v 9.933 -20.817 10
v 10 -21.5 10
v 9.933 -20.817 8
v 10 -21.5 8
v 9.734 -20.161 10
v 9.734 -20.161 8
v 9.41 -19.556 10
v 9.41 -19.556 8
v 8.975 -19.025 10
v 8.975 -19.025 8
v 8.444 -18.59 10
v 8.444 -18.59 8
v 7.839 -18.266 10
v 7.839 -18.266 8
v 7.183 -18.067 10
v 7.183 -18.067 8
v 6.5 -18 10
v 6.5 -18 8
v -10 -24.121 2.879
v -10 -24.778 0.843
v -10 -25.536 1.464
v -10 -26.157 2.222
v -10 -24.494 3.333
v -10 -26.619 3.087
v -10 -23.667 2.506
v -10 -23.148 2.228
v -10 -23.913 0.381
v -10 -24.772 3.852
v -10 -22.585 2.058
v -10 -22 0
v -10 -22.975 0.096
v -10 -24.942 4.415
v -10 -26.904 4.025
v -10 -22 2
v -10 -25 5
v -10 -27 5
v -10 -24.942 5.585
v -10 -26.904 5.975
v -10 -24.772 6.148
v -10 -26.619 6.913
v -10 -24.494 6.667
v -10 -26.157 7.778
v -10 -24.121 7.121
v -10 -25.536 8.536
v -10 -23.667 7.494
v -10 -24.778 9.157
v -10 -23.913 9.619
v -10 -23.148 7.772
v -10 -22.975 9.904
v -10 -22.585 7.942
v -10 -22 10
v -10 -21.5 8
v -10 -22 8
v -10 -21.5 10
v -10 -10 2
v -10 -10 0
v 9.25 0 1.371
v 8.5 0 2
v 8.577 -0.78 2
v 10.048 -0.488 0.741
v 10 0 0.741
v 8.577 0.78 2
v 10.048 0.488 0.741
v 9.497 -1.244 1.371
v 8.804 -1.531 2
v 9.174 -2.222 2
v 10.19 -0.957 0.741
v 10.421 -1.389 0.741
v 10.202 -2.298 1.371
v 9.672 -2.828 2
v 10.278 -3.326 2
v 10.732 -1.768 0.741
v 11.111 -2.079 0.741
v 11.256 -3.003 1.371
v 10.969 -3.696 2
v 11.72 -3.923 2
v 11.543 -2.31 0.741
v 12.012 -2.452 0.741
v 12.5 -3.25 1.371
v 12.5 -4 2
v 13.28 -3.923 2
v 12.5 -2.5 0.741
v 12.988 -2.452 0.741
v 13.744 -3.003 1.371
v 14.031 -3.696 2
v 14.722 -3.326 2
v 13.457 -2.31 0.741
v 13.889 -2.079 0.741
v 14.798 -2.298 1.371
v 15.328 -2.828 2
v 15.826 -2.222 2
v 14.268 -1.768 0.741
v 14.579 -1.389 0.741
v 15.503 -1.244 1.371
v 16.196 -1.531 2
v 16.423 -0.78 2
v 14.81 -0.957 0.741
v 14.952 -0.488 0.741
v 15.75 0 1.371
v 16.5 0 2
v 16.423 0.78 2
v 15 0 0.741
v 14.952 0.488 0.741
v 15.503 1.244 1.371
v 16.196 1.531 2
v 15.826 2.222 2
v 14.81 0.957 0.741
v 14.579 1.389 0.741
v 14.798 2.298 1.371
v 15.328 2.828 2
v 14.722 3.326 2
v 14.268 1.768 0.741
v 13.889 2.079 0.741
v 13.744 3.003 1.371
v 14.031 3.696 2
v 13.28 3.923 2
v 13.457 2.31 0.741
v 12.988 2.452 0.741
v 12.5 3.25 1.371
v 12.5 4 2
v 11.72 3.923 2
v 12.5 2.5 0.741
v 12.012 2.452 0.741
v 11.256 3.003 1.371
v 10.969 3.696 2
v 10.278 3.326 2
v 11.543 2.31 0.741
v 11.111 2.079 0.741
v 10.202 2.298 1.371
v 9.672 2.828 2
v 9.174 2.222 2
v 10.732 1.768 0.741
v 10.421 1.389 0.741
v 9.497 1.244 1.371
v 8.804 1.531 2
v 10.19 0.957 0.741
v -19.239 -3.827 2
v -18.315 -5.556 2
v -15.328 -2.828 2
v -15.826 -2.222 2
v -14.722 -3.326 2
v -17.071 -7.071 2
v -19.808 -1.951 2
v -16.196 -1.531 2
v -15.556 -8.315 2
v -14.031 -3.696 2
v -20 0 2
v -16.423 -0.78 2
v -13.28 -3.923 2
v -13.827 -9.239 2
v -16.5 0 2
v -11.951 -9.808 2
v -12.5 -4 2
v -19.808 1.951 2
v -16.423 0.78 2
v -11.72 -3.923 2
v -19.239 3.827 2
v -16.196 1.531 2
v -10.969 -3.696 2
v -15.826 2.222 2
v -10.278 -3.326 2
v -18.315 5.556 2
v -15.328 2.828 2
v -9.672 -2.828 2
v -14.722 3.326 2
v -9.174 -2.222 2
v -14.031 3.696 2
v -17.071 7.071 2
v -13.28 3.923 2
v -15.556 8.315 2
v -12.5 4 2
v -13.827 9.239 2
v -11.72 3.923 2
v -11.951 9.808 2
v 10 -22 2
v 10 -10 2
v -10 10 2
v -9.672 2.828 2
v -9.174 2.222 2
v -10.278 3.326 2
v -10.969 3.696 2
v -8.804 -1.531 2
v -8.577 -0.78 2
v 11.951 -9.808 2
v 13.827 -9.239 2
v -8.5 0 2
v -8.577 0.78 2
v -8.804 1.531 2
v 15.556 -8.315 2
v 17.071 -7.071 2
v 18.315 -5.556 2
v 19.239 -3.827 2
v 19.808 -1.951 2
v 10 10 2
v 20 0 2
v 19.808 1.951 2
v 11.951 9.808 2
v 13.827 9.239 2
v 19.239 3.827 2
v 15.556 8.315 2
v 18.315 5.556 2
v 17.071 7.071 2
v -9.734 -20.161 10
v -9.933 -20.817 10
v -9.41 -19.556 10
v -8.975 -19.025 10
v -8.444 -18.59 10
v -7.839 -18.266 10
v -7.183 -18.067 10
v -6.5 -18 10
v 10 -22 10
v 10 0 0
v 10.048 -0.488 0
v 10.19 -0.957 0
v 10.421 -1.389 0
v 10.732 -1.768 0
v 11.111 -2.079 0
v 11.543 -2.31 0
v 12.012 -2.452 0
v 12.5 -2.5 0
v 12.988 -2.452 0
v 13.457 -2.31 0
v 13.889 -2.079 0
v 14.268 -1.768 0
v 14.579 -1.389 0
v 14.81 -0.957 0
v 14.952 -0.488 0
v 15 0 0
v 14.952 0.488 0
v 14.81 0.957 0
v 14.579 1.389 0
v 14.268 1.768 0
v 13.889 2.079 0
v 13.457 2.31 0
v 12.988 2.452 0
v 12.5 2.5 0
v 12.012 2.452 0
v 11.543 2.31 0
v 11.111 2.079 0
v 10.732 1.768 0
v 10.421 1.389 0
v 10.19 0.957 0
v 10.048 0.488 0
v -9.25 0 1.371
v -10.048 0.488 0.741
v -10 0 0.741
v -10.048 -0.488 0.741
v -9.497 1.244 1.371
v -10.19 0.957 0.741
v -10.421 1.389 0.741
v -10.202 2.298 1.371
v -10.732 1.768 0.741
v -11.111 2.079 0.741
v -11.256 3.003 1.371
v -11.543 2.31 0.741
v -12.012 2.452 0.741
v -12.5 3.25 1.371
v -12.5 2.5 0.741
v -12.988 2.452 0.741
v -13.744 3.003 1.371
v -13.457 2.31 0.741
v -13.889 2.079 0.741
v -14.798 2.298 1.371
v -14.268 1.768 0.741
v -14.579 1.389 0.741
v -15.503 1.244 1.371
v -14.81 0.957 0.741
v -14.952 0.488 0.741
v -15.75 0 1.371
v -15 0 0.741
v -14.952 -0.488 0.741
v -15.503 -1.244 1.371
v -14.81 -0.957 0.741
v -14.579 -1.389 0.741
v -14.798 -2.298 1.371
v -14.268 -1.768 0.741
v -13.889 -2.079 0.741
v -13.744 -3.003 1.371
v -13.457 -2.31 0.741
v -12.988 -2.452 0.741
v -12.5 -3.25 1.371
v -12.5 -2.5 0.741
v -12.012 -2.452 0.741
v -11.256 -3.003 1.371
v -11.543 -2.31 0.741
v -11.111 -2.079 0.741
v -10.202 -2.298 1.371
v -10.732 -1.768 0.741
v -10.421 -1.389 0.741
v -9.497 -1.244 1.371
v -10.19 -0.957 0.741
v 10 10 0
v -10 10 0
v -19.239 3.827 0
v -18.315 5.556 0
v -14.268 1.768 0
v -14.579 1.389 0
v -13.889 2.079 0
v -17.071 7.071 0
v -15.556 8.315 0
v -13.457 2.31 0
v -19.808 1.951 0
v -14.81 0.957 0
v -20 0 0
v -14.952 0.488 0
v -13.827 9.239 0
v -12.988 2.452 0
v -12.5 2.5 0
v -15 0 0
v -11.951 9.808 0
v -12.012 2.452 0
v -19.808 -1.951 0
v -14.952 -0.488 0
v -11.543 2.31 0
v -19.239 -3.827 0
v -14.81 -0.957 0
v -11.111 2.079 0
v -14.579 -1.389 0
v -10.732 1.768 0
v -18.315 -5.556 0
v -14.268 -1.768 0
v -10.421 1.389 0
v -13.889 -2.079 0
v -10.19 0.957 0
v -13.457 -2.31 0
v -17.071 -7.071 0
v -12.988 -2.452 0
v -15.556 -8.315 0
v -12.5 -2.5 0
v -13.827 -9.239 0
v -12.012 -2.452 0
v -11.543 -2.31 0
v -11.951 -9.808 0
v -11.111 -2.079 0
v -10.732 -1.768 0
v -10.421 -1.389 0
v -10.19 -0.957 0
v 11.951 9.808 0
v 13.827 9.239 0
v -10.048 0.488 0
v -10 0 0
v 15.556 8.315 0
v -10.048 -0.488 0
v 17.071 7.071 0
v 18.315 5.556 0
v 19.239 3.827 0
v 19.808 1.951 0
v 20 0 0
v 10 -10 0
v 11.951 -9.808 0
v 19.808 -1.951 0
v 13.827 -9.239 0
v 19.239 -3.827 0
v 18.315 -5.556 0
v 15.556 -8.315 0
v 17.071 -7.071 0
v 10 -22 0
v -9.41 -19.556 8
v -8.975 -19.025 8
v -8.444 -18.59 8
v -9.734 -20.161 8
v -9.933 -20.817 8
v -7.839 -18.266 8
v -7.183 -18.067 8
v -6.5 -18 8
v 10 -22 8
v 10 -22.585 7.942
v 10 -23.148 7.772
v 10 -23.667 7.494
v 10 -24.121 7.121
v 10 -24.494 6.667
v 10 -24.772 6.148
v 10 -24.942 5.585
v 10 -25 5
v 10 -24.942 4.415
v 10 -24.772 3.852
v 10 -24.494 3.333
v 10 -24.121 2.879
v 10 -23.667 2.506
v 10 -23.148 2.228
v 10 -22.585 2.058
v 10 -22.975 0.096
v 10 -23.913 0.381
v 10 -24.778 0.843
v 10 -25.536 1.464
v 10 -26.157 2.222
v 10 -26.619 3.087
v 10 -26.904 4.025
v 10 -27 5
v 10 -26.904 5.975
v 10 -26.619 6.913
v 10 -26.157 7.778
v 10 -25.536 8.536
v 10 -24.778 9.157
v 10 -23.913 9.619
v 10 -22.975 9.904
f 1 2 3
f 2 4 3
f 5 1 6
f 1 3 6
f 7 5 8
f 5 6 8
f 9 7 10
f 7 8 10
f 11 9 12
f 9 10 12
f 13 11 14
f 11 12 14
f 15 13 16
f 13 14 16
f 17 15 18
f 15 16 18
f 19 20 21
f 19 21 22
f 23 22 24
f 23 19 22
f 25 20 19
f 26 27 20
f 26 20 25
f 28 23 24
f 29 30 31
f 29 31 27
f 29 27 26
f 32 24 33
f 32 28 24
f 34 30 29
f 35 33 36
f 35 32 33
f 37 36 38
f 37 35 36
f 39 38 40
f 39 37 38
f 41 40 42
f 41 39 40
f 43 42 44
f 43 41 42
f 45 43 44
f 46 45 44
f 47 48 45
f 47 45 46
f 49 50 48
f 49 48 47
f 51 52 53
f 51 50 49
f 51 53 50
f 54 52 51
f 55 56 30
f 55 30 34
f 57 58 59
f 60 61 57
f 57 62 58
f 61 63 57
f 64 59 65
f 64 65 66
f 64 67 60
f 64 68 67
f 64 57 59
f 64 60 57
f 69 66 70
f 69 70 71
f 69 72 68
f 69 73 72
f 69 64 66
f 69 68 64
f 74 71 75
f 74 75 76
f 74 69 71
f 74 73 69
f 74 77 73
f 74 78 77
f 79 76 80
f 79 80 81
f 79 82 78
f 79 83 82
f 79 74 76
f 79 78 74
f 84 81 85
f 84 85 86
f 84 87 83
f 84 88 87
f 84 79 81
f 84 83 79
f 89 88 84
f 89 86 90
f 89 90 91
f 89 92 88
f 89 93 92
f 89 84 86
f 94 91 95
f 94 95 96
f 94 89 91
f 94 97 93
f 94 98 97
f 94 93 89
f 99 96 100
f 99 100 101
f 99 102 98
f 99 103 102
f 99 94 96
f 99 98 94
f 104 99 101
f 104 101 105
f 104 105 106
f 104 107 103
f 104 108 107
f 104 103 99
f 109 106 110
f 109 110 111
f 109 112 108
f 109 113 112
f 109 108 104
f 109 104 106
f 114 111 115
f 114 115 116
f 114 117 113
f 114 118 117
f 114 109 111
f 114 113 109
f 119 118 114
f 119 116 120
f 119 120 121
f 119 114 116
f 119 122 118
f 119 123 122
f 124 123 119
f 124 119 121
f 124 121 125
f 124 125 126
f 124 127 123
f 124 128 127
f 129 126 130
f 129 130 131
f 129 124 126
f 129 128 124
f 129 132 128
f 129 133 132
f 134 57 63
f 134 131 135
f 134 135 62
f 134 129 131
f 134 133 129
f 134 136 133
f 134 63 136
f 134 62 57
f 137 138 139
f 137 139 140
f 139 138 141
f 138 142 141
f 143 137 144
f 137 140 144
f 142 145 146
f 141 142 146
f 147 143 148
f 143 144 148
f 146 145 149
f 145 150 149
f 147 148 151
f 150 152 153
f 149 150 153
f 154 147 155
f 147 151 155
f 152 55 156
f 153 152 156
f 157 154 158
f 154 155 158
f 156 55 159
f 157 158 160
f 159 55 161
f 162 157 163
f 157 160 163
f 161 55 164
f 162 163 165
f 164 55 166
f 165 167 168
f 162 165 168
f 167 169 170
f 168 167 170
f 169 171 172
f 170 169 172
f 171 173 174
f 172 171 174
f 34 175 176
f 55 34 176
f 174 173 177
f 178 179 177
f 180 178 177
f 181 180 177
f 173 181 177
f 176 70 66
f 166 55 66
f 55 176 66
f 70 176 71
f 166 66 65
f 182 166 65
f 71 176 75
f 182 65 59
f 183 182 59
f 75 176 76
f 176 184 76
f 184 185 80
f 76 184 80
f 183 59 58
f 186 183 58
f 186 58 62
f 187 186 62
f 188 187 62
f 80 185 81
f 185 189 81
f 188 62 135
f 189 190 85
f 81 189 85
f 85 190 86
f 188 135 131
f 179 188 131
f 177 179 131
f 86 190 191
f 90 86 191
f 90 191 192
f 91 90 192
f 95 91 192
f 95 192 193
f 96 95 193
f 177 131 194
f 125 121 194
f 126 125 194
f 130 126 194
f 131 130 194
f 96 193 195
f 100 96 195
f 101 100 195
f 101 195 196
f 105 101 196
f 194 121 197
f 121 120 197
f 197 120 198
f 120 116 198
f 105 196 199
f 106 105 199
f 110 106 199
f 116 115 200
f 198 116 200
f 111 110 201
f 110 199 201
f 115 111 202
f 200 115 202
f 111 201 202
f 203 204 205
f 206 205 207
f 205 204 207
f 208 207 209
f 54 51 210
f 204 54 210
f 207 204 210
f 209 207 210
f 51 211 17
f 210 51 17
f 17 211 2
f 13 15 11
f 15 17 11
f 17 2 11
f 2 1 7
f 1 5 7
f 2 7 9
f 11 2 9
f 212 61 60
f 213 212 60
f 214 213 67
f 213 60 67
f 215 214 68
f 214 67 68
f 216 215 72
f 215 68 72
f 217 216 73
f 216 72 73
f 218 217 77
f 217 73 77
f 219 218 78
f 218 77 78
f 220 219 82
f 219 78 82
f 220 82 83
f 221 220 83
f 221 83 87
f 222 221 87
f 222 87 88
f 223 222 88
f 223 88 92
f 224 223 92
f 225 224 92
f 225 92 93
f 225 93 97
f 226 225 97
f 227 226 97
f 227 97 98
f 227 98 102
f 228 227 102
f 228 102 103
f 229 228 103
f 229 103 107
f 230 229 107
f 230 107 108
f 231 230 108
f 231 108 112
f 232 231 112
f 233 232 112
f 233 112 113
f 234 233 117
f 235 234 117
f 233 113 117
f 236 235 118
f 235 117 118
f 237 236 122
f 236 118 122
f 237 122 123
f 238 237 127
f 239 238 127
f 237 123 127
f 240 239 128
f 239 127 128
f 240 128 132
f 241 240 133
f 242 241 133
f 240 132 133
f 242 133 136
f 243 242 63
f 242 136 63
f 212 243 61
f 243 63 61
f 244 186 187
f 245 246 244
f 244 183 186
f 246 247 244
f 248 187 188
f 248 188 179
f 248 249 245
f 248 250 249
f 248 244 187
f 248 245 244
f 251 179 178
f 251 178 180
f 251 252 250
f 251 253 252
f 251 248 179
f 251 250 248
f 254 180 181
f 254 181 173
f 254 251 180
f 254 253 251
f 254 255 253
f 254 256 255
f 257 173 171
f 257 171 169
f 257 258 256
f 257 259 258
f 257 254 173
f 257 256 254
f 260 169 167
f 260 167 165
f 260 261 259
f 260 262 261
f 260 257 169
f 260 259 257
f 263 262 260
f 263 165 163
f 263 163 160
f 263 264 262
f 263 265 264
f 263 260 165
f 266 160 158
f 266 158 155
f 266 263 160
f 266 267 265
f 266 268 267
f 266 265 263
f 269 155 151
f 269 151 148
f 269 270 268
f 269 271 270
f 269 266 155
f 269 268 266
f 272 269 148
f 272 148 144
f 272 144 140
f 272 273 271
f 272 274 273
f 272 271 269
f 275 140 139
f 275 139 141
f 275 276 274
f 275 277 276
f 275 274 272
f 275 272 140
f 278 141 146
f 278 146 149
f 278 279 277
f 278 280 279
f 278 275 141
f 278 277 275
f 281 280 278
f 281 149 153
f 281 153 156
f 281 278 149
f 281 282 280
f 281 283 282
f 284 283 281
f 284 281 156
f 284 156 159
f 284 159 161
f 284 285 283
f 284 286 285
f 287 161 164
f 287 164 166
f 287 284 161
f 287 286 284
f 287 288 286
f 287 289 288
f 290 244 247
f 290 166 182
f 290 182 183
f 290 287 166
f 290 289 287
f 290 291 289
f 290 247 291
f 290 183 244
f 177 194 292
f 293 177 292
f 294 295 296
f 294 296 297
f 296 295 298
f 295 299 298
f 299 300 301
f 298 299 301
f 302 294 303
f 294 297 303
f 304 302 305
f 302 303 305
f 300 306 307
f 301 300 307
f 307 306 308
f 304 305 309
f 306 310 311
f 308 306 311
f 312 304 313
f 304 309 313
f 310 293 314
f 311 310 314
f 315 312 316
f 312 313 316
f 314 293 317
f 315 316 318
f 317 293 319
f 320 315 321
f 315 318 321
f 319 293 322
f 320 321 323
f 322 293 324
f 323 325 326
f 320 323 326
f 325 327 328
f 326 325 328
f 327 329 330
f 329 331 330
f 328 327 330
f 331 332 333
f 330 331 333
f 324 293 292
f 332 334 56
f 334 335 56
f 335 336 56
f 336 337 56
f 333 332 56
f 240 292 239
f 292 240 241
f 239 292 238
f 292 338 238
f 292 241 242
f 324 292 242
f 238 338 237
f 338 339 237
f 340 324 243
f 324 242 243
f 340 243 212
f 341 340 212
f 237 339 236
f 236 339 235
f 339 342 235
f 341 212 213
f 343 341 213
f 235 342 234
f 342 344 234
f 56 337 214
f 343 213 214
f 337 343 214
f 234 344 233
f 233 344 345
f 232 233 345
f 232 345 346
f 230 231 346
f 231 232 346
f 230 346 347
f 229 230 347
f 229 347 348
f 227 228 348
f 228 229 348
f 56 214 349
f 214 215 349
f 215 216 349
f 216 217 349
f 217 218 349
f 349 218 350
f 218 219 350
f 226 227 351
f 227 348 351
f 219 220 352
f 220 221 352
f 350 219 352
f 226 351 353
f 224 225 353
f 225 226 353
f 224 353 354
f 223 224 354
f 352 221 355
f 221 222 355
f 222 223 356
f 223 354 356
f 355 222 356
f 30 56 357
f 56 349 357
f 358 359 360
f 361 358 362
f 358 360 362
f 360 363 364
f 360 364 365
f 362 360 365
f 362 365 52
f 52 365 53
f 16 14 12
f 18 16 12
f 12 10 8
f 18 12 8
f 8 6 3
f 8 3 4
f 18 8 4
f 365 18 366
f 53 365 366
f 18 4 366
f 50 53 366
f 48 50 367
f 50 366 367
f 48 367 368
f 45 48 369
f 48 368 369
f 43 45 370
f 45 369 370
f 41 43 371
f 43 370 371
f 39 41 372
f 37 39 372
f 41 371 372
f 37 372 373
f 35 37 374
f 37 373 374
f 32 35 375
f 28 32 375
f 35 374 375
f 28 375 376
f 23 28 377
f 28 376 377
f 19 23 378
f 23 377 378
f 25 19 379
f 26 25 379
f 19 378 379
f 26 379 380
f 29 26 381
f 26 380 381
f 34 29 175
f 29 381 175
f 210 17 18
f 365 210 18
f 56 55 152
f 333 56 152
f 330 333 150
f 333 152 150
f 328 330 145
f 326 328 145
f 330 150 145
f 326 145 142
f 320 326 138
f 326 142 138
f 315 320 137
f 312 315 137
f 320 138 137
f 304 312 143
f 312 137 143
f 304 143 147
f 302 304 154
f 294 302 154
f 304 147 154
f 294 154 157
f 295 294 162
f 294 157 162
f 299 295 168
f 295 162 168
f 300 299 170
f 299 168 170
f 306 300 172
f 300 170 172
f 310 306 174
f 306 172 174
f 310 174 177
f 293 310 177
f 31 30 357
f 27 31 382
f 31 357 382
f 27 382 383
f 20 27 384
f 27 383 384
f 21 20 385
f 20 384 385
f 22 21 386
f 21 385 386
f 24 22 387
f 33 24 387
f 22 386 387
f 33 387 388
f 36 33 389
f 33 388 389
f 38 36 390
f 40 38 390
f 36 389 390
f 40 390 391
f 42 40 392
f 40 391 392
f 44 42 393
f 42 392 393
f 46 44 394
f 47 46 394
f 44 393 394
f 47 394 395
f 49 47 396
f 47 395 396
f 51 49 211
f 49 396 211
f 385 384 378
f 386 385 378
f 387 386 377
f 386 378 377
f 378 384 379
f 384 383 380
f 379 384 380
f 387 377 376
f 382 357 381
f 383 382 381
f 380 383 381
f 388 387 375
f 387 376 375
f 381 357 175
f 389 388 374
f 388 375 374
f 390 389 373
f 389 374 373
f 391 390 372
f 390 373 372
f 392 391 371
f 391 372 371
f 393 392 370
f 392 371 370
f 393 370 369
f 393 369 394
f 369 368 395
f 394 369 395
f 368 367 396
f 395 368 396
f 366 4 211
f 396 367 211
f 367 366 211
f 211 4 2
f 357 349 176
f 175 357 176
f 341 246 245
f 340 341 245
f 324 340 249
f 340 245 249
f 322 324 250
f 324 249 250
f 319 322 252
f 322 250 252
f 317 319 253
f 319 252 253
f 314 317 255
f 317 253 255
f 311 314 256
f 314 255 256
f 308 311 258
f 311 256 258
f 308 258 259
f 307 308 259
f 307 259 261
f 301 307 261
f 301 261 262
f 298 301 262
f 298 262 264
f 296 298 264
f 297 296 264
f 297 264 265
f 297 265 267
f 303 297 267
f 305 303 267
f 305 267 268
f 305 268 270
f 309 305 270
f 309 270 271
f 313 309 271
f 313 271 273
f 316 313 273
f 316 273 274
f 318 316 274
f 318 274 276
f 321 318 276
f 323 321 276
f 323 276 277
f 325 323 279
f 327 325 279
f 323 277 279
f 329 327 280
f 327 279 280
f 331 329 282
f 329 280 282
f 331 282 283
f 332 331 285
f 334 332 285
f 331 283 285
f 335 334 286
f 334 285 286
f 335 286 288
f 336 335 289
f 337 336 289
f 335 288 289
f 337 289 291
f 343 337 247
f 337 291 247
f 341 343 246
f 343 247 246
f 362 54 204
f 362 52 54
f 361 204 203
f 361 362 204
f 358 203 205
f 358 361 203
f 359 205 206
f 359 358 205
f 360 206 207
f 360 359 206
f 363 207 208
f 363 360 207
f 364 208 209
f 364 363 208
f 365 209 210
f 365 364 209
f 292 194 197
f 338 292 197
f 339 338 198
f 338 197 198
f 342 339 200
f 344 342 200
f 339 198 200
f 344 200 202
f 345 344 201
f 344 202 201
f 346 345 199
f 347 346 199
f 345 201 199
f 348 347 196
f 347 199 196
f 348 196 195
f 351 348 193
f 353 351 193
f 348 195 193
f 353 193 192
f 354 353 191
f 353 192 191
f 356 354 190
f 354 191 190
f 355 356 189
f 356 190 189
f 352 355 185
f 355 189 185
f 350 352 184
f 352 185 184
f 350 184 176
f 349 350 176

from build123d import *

# Parameters (mm, degrees)
T_LE_DE_BASE_PLI_E1_DEPTH = 10
PATTE1_DEPTH              = 2
ESQUISSE9_R               = 2.5
ENL_V_MAT_EXTRU_1_DEPTH   = 35.539832078
CHANFREIN1_SIZE           = 1.5
CHANFREIN1_SIZE2          = 1.258649447
CONG_1_R                  = 3.5


# Sheet-metal steps are written as plain solids
with BuildPart() as part:
    # Esquisse1 → Tôle de base pliée1 (new, symmetric)
    with BuildSketch(Plane(origin=(0, 0, 0), x_dir=(0, 0, -1), z_dir=(1, 0, 0))):
        with BuildLine():
            Line((0, 10), (0, -22))
            ThreePointArc((0, -22), (-5, -27), (-10, -22))
            Line((-10, -22), (-10, -18))
            Line((-10, -18), (-8, -18))
            Line((-8, -18), (-8, -22))
            ThreePointArc((-8, -22), (-5, -25), (-2, -22))
            Line((-2, -22), (-2, 10))
            Line((-2, 10), (0, 10))
        make_face()
    extrude(amount=T_LE_DE_BASE_PLI_E1_DEPTH, both=True)

    # Esquisse6 → Patte1 (add)
    with BuildSketch(Plane.XY.offset(2)):
        with BuildLine():
            Line((-10, 10), (10, 10))
            ThreePointArc((10, 10), (20, 0), (10, -10))
            Line((10, -10), (-10, -10))
            ThreePointArc((-10, -10), (-20, 0), (-10, 10))
        make_face()
    extrude(amount=-PATTE1_DEPTH)

    # Esquisse9 → Enlèv. mat.-Extru.1 (cut, through all)
    with BuildSketch(Plane.XY.offset(2)):
        with Locations((-12.5, 0)):
            Circle(ESQUISSE9_R)
        with Locations(Location((12.5, 0, 0), (0, 0, 180))):
            Circle(ESQUISSE9_R)
    extrude(amount=-ENL_V_MAT_EXTRU_1_DEPTH, mode=Mode.SUBTRACT)

    # Chanfrein1
    chanfrein1_edges = [part.edges().sort_by_distance(p)[0] for p in [
        (-15, 0, 2),
        (15, 0, 2),
    ]]
    chanfrein1_side = [part.faces().sort_by_distance(p)[0] for p in [
        (0, -4.197228845, 2),
    ]]
    chamfer(chanfrein1_edges, length=CHANFREIN1_SIZE, length2=CHANFREIN1_SIZE2, reference=chanfrein1_side[0])

    # Congé1
    cong_1_edges = [part.edges().sort_by_distance(p)[0] for p in [
        (10, -18, 9),
        (-10, -18, 9),
    ]]
    fillet(cong_1_edges, radius=CONG_1_R)


solid = part.part
